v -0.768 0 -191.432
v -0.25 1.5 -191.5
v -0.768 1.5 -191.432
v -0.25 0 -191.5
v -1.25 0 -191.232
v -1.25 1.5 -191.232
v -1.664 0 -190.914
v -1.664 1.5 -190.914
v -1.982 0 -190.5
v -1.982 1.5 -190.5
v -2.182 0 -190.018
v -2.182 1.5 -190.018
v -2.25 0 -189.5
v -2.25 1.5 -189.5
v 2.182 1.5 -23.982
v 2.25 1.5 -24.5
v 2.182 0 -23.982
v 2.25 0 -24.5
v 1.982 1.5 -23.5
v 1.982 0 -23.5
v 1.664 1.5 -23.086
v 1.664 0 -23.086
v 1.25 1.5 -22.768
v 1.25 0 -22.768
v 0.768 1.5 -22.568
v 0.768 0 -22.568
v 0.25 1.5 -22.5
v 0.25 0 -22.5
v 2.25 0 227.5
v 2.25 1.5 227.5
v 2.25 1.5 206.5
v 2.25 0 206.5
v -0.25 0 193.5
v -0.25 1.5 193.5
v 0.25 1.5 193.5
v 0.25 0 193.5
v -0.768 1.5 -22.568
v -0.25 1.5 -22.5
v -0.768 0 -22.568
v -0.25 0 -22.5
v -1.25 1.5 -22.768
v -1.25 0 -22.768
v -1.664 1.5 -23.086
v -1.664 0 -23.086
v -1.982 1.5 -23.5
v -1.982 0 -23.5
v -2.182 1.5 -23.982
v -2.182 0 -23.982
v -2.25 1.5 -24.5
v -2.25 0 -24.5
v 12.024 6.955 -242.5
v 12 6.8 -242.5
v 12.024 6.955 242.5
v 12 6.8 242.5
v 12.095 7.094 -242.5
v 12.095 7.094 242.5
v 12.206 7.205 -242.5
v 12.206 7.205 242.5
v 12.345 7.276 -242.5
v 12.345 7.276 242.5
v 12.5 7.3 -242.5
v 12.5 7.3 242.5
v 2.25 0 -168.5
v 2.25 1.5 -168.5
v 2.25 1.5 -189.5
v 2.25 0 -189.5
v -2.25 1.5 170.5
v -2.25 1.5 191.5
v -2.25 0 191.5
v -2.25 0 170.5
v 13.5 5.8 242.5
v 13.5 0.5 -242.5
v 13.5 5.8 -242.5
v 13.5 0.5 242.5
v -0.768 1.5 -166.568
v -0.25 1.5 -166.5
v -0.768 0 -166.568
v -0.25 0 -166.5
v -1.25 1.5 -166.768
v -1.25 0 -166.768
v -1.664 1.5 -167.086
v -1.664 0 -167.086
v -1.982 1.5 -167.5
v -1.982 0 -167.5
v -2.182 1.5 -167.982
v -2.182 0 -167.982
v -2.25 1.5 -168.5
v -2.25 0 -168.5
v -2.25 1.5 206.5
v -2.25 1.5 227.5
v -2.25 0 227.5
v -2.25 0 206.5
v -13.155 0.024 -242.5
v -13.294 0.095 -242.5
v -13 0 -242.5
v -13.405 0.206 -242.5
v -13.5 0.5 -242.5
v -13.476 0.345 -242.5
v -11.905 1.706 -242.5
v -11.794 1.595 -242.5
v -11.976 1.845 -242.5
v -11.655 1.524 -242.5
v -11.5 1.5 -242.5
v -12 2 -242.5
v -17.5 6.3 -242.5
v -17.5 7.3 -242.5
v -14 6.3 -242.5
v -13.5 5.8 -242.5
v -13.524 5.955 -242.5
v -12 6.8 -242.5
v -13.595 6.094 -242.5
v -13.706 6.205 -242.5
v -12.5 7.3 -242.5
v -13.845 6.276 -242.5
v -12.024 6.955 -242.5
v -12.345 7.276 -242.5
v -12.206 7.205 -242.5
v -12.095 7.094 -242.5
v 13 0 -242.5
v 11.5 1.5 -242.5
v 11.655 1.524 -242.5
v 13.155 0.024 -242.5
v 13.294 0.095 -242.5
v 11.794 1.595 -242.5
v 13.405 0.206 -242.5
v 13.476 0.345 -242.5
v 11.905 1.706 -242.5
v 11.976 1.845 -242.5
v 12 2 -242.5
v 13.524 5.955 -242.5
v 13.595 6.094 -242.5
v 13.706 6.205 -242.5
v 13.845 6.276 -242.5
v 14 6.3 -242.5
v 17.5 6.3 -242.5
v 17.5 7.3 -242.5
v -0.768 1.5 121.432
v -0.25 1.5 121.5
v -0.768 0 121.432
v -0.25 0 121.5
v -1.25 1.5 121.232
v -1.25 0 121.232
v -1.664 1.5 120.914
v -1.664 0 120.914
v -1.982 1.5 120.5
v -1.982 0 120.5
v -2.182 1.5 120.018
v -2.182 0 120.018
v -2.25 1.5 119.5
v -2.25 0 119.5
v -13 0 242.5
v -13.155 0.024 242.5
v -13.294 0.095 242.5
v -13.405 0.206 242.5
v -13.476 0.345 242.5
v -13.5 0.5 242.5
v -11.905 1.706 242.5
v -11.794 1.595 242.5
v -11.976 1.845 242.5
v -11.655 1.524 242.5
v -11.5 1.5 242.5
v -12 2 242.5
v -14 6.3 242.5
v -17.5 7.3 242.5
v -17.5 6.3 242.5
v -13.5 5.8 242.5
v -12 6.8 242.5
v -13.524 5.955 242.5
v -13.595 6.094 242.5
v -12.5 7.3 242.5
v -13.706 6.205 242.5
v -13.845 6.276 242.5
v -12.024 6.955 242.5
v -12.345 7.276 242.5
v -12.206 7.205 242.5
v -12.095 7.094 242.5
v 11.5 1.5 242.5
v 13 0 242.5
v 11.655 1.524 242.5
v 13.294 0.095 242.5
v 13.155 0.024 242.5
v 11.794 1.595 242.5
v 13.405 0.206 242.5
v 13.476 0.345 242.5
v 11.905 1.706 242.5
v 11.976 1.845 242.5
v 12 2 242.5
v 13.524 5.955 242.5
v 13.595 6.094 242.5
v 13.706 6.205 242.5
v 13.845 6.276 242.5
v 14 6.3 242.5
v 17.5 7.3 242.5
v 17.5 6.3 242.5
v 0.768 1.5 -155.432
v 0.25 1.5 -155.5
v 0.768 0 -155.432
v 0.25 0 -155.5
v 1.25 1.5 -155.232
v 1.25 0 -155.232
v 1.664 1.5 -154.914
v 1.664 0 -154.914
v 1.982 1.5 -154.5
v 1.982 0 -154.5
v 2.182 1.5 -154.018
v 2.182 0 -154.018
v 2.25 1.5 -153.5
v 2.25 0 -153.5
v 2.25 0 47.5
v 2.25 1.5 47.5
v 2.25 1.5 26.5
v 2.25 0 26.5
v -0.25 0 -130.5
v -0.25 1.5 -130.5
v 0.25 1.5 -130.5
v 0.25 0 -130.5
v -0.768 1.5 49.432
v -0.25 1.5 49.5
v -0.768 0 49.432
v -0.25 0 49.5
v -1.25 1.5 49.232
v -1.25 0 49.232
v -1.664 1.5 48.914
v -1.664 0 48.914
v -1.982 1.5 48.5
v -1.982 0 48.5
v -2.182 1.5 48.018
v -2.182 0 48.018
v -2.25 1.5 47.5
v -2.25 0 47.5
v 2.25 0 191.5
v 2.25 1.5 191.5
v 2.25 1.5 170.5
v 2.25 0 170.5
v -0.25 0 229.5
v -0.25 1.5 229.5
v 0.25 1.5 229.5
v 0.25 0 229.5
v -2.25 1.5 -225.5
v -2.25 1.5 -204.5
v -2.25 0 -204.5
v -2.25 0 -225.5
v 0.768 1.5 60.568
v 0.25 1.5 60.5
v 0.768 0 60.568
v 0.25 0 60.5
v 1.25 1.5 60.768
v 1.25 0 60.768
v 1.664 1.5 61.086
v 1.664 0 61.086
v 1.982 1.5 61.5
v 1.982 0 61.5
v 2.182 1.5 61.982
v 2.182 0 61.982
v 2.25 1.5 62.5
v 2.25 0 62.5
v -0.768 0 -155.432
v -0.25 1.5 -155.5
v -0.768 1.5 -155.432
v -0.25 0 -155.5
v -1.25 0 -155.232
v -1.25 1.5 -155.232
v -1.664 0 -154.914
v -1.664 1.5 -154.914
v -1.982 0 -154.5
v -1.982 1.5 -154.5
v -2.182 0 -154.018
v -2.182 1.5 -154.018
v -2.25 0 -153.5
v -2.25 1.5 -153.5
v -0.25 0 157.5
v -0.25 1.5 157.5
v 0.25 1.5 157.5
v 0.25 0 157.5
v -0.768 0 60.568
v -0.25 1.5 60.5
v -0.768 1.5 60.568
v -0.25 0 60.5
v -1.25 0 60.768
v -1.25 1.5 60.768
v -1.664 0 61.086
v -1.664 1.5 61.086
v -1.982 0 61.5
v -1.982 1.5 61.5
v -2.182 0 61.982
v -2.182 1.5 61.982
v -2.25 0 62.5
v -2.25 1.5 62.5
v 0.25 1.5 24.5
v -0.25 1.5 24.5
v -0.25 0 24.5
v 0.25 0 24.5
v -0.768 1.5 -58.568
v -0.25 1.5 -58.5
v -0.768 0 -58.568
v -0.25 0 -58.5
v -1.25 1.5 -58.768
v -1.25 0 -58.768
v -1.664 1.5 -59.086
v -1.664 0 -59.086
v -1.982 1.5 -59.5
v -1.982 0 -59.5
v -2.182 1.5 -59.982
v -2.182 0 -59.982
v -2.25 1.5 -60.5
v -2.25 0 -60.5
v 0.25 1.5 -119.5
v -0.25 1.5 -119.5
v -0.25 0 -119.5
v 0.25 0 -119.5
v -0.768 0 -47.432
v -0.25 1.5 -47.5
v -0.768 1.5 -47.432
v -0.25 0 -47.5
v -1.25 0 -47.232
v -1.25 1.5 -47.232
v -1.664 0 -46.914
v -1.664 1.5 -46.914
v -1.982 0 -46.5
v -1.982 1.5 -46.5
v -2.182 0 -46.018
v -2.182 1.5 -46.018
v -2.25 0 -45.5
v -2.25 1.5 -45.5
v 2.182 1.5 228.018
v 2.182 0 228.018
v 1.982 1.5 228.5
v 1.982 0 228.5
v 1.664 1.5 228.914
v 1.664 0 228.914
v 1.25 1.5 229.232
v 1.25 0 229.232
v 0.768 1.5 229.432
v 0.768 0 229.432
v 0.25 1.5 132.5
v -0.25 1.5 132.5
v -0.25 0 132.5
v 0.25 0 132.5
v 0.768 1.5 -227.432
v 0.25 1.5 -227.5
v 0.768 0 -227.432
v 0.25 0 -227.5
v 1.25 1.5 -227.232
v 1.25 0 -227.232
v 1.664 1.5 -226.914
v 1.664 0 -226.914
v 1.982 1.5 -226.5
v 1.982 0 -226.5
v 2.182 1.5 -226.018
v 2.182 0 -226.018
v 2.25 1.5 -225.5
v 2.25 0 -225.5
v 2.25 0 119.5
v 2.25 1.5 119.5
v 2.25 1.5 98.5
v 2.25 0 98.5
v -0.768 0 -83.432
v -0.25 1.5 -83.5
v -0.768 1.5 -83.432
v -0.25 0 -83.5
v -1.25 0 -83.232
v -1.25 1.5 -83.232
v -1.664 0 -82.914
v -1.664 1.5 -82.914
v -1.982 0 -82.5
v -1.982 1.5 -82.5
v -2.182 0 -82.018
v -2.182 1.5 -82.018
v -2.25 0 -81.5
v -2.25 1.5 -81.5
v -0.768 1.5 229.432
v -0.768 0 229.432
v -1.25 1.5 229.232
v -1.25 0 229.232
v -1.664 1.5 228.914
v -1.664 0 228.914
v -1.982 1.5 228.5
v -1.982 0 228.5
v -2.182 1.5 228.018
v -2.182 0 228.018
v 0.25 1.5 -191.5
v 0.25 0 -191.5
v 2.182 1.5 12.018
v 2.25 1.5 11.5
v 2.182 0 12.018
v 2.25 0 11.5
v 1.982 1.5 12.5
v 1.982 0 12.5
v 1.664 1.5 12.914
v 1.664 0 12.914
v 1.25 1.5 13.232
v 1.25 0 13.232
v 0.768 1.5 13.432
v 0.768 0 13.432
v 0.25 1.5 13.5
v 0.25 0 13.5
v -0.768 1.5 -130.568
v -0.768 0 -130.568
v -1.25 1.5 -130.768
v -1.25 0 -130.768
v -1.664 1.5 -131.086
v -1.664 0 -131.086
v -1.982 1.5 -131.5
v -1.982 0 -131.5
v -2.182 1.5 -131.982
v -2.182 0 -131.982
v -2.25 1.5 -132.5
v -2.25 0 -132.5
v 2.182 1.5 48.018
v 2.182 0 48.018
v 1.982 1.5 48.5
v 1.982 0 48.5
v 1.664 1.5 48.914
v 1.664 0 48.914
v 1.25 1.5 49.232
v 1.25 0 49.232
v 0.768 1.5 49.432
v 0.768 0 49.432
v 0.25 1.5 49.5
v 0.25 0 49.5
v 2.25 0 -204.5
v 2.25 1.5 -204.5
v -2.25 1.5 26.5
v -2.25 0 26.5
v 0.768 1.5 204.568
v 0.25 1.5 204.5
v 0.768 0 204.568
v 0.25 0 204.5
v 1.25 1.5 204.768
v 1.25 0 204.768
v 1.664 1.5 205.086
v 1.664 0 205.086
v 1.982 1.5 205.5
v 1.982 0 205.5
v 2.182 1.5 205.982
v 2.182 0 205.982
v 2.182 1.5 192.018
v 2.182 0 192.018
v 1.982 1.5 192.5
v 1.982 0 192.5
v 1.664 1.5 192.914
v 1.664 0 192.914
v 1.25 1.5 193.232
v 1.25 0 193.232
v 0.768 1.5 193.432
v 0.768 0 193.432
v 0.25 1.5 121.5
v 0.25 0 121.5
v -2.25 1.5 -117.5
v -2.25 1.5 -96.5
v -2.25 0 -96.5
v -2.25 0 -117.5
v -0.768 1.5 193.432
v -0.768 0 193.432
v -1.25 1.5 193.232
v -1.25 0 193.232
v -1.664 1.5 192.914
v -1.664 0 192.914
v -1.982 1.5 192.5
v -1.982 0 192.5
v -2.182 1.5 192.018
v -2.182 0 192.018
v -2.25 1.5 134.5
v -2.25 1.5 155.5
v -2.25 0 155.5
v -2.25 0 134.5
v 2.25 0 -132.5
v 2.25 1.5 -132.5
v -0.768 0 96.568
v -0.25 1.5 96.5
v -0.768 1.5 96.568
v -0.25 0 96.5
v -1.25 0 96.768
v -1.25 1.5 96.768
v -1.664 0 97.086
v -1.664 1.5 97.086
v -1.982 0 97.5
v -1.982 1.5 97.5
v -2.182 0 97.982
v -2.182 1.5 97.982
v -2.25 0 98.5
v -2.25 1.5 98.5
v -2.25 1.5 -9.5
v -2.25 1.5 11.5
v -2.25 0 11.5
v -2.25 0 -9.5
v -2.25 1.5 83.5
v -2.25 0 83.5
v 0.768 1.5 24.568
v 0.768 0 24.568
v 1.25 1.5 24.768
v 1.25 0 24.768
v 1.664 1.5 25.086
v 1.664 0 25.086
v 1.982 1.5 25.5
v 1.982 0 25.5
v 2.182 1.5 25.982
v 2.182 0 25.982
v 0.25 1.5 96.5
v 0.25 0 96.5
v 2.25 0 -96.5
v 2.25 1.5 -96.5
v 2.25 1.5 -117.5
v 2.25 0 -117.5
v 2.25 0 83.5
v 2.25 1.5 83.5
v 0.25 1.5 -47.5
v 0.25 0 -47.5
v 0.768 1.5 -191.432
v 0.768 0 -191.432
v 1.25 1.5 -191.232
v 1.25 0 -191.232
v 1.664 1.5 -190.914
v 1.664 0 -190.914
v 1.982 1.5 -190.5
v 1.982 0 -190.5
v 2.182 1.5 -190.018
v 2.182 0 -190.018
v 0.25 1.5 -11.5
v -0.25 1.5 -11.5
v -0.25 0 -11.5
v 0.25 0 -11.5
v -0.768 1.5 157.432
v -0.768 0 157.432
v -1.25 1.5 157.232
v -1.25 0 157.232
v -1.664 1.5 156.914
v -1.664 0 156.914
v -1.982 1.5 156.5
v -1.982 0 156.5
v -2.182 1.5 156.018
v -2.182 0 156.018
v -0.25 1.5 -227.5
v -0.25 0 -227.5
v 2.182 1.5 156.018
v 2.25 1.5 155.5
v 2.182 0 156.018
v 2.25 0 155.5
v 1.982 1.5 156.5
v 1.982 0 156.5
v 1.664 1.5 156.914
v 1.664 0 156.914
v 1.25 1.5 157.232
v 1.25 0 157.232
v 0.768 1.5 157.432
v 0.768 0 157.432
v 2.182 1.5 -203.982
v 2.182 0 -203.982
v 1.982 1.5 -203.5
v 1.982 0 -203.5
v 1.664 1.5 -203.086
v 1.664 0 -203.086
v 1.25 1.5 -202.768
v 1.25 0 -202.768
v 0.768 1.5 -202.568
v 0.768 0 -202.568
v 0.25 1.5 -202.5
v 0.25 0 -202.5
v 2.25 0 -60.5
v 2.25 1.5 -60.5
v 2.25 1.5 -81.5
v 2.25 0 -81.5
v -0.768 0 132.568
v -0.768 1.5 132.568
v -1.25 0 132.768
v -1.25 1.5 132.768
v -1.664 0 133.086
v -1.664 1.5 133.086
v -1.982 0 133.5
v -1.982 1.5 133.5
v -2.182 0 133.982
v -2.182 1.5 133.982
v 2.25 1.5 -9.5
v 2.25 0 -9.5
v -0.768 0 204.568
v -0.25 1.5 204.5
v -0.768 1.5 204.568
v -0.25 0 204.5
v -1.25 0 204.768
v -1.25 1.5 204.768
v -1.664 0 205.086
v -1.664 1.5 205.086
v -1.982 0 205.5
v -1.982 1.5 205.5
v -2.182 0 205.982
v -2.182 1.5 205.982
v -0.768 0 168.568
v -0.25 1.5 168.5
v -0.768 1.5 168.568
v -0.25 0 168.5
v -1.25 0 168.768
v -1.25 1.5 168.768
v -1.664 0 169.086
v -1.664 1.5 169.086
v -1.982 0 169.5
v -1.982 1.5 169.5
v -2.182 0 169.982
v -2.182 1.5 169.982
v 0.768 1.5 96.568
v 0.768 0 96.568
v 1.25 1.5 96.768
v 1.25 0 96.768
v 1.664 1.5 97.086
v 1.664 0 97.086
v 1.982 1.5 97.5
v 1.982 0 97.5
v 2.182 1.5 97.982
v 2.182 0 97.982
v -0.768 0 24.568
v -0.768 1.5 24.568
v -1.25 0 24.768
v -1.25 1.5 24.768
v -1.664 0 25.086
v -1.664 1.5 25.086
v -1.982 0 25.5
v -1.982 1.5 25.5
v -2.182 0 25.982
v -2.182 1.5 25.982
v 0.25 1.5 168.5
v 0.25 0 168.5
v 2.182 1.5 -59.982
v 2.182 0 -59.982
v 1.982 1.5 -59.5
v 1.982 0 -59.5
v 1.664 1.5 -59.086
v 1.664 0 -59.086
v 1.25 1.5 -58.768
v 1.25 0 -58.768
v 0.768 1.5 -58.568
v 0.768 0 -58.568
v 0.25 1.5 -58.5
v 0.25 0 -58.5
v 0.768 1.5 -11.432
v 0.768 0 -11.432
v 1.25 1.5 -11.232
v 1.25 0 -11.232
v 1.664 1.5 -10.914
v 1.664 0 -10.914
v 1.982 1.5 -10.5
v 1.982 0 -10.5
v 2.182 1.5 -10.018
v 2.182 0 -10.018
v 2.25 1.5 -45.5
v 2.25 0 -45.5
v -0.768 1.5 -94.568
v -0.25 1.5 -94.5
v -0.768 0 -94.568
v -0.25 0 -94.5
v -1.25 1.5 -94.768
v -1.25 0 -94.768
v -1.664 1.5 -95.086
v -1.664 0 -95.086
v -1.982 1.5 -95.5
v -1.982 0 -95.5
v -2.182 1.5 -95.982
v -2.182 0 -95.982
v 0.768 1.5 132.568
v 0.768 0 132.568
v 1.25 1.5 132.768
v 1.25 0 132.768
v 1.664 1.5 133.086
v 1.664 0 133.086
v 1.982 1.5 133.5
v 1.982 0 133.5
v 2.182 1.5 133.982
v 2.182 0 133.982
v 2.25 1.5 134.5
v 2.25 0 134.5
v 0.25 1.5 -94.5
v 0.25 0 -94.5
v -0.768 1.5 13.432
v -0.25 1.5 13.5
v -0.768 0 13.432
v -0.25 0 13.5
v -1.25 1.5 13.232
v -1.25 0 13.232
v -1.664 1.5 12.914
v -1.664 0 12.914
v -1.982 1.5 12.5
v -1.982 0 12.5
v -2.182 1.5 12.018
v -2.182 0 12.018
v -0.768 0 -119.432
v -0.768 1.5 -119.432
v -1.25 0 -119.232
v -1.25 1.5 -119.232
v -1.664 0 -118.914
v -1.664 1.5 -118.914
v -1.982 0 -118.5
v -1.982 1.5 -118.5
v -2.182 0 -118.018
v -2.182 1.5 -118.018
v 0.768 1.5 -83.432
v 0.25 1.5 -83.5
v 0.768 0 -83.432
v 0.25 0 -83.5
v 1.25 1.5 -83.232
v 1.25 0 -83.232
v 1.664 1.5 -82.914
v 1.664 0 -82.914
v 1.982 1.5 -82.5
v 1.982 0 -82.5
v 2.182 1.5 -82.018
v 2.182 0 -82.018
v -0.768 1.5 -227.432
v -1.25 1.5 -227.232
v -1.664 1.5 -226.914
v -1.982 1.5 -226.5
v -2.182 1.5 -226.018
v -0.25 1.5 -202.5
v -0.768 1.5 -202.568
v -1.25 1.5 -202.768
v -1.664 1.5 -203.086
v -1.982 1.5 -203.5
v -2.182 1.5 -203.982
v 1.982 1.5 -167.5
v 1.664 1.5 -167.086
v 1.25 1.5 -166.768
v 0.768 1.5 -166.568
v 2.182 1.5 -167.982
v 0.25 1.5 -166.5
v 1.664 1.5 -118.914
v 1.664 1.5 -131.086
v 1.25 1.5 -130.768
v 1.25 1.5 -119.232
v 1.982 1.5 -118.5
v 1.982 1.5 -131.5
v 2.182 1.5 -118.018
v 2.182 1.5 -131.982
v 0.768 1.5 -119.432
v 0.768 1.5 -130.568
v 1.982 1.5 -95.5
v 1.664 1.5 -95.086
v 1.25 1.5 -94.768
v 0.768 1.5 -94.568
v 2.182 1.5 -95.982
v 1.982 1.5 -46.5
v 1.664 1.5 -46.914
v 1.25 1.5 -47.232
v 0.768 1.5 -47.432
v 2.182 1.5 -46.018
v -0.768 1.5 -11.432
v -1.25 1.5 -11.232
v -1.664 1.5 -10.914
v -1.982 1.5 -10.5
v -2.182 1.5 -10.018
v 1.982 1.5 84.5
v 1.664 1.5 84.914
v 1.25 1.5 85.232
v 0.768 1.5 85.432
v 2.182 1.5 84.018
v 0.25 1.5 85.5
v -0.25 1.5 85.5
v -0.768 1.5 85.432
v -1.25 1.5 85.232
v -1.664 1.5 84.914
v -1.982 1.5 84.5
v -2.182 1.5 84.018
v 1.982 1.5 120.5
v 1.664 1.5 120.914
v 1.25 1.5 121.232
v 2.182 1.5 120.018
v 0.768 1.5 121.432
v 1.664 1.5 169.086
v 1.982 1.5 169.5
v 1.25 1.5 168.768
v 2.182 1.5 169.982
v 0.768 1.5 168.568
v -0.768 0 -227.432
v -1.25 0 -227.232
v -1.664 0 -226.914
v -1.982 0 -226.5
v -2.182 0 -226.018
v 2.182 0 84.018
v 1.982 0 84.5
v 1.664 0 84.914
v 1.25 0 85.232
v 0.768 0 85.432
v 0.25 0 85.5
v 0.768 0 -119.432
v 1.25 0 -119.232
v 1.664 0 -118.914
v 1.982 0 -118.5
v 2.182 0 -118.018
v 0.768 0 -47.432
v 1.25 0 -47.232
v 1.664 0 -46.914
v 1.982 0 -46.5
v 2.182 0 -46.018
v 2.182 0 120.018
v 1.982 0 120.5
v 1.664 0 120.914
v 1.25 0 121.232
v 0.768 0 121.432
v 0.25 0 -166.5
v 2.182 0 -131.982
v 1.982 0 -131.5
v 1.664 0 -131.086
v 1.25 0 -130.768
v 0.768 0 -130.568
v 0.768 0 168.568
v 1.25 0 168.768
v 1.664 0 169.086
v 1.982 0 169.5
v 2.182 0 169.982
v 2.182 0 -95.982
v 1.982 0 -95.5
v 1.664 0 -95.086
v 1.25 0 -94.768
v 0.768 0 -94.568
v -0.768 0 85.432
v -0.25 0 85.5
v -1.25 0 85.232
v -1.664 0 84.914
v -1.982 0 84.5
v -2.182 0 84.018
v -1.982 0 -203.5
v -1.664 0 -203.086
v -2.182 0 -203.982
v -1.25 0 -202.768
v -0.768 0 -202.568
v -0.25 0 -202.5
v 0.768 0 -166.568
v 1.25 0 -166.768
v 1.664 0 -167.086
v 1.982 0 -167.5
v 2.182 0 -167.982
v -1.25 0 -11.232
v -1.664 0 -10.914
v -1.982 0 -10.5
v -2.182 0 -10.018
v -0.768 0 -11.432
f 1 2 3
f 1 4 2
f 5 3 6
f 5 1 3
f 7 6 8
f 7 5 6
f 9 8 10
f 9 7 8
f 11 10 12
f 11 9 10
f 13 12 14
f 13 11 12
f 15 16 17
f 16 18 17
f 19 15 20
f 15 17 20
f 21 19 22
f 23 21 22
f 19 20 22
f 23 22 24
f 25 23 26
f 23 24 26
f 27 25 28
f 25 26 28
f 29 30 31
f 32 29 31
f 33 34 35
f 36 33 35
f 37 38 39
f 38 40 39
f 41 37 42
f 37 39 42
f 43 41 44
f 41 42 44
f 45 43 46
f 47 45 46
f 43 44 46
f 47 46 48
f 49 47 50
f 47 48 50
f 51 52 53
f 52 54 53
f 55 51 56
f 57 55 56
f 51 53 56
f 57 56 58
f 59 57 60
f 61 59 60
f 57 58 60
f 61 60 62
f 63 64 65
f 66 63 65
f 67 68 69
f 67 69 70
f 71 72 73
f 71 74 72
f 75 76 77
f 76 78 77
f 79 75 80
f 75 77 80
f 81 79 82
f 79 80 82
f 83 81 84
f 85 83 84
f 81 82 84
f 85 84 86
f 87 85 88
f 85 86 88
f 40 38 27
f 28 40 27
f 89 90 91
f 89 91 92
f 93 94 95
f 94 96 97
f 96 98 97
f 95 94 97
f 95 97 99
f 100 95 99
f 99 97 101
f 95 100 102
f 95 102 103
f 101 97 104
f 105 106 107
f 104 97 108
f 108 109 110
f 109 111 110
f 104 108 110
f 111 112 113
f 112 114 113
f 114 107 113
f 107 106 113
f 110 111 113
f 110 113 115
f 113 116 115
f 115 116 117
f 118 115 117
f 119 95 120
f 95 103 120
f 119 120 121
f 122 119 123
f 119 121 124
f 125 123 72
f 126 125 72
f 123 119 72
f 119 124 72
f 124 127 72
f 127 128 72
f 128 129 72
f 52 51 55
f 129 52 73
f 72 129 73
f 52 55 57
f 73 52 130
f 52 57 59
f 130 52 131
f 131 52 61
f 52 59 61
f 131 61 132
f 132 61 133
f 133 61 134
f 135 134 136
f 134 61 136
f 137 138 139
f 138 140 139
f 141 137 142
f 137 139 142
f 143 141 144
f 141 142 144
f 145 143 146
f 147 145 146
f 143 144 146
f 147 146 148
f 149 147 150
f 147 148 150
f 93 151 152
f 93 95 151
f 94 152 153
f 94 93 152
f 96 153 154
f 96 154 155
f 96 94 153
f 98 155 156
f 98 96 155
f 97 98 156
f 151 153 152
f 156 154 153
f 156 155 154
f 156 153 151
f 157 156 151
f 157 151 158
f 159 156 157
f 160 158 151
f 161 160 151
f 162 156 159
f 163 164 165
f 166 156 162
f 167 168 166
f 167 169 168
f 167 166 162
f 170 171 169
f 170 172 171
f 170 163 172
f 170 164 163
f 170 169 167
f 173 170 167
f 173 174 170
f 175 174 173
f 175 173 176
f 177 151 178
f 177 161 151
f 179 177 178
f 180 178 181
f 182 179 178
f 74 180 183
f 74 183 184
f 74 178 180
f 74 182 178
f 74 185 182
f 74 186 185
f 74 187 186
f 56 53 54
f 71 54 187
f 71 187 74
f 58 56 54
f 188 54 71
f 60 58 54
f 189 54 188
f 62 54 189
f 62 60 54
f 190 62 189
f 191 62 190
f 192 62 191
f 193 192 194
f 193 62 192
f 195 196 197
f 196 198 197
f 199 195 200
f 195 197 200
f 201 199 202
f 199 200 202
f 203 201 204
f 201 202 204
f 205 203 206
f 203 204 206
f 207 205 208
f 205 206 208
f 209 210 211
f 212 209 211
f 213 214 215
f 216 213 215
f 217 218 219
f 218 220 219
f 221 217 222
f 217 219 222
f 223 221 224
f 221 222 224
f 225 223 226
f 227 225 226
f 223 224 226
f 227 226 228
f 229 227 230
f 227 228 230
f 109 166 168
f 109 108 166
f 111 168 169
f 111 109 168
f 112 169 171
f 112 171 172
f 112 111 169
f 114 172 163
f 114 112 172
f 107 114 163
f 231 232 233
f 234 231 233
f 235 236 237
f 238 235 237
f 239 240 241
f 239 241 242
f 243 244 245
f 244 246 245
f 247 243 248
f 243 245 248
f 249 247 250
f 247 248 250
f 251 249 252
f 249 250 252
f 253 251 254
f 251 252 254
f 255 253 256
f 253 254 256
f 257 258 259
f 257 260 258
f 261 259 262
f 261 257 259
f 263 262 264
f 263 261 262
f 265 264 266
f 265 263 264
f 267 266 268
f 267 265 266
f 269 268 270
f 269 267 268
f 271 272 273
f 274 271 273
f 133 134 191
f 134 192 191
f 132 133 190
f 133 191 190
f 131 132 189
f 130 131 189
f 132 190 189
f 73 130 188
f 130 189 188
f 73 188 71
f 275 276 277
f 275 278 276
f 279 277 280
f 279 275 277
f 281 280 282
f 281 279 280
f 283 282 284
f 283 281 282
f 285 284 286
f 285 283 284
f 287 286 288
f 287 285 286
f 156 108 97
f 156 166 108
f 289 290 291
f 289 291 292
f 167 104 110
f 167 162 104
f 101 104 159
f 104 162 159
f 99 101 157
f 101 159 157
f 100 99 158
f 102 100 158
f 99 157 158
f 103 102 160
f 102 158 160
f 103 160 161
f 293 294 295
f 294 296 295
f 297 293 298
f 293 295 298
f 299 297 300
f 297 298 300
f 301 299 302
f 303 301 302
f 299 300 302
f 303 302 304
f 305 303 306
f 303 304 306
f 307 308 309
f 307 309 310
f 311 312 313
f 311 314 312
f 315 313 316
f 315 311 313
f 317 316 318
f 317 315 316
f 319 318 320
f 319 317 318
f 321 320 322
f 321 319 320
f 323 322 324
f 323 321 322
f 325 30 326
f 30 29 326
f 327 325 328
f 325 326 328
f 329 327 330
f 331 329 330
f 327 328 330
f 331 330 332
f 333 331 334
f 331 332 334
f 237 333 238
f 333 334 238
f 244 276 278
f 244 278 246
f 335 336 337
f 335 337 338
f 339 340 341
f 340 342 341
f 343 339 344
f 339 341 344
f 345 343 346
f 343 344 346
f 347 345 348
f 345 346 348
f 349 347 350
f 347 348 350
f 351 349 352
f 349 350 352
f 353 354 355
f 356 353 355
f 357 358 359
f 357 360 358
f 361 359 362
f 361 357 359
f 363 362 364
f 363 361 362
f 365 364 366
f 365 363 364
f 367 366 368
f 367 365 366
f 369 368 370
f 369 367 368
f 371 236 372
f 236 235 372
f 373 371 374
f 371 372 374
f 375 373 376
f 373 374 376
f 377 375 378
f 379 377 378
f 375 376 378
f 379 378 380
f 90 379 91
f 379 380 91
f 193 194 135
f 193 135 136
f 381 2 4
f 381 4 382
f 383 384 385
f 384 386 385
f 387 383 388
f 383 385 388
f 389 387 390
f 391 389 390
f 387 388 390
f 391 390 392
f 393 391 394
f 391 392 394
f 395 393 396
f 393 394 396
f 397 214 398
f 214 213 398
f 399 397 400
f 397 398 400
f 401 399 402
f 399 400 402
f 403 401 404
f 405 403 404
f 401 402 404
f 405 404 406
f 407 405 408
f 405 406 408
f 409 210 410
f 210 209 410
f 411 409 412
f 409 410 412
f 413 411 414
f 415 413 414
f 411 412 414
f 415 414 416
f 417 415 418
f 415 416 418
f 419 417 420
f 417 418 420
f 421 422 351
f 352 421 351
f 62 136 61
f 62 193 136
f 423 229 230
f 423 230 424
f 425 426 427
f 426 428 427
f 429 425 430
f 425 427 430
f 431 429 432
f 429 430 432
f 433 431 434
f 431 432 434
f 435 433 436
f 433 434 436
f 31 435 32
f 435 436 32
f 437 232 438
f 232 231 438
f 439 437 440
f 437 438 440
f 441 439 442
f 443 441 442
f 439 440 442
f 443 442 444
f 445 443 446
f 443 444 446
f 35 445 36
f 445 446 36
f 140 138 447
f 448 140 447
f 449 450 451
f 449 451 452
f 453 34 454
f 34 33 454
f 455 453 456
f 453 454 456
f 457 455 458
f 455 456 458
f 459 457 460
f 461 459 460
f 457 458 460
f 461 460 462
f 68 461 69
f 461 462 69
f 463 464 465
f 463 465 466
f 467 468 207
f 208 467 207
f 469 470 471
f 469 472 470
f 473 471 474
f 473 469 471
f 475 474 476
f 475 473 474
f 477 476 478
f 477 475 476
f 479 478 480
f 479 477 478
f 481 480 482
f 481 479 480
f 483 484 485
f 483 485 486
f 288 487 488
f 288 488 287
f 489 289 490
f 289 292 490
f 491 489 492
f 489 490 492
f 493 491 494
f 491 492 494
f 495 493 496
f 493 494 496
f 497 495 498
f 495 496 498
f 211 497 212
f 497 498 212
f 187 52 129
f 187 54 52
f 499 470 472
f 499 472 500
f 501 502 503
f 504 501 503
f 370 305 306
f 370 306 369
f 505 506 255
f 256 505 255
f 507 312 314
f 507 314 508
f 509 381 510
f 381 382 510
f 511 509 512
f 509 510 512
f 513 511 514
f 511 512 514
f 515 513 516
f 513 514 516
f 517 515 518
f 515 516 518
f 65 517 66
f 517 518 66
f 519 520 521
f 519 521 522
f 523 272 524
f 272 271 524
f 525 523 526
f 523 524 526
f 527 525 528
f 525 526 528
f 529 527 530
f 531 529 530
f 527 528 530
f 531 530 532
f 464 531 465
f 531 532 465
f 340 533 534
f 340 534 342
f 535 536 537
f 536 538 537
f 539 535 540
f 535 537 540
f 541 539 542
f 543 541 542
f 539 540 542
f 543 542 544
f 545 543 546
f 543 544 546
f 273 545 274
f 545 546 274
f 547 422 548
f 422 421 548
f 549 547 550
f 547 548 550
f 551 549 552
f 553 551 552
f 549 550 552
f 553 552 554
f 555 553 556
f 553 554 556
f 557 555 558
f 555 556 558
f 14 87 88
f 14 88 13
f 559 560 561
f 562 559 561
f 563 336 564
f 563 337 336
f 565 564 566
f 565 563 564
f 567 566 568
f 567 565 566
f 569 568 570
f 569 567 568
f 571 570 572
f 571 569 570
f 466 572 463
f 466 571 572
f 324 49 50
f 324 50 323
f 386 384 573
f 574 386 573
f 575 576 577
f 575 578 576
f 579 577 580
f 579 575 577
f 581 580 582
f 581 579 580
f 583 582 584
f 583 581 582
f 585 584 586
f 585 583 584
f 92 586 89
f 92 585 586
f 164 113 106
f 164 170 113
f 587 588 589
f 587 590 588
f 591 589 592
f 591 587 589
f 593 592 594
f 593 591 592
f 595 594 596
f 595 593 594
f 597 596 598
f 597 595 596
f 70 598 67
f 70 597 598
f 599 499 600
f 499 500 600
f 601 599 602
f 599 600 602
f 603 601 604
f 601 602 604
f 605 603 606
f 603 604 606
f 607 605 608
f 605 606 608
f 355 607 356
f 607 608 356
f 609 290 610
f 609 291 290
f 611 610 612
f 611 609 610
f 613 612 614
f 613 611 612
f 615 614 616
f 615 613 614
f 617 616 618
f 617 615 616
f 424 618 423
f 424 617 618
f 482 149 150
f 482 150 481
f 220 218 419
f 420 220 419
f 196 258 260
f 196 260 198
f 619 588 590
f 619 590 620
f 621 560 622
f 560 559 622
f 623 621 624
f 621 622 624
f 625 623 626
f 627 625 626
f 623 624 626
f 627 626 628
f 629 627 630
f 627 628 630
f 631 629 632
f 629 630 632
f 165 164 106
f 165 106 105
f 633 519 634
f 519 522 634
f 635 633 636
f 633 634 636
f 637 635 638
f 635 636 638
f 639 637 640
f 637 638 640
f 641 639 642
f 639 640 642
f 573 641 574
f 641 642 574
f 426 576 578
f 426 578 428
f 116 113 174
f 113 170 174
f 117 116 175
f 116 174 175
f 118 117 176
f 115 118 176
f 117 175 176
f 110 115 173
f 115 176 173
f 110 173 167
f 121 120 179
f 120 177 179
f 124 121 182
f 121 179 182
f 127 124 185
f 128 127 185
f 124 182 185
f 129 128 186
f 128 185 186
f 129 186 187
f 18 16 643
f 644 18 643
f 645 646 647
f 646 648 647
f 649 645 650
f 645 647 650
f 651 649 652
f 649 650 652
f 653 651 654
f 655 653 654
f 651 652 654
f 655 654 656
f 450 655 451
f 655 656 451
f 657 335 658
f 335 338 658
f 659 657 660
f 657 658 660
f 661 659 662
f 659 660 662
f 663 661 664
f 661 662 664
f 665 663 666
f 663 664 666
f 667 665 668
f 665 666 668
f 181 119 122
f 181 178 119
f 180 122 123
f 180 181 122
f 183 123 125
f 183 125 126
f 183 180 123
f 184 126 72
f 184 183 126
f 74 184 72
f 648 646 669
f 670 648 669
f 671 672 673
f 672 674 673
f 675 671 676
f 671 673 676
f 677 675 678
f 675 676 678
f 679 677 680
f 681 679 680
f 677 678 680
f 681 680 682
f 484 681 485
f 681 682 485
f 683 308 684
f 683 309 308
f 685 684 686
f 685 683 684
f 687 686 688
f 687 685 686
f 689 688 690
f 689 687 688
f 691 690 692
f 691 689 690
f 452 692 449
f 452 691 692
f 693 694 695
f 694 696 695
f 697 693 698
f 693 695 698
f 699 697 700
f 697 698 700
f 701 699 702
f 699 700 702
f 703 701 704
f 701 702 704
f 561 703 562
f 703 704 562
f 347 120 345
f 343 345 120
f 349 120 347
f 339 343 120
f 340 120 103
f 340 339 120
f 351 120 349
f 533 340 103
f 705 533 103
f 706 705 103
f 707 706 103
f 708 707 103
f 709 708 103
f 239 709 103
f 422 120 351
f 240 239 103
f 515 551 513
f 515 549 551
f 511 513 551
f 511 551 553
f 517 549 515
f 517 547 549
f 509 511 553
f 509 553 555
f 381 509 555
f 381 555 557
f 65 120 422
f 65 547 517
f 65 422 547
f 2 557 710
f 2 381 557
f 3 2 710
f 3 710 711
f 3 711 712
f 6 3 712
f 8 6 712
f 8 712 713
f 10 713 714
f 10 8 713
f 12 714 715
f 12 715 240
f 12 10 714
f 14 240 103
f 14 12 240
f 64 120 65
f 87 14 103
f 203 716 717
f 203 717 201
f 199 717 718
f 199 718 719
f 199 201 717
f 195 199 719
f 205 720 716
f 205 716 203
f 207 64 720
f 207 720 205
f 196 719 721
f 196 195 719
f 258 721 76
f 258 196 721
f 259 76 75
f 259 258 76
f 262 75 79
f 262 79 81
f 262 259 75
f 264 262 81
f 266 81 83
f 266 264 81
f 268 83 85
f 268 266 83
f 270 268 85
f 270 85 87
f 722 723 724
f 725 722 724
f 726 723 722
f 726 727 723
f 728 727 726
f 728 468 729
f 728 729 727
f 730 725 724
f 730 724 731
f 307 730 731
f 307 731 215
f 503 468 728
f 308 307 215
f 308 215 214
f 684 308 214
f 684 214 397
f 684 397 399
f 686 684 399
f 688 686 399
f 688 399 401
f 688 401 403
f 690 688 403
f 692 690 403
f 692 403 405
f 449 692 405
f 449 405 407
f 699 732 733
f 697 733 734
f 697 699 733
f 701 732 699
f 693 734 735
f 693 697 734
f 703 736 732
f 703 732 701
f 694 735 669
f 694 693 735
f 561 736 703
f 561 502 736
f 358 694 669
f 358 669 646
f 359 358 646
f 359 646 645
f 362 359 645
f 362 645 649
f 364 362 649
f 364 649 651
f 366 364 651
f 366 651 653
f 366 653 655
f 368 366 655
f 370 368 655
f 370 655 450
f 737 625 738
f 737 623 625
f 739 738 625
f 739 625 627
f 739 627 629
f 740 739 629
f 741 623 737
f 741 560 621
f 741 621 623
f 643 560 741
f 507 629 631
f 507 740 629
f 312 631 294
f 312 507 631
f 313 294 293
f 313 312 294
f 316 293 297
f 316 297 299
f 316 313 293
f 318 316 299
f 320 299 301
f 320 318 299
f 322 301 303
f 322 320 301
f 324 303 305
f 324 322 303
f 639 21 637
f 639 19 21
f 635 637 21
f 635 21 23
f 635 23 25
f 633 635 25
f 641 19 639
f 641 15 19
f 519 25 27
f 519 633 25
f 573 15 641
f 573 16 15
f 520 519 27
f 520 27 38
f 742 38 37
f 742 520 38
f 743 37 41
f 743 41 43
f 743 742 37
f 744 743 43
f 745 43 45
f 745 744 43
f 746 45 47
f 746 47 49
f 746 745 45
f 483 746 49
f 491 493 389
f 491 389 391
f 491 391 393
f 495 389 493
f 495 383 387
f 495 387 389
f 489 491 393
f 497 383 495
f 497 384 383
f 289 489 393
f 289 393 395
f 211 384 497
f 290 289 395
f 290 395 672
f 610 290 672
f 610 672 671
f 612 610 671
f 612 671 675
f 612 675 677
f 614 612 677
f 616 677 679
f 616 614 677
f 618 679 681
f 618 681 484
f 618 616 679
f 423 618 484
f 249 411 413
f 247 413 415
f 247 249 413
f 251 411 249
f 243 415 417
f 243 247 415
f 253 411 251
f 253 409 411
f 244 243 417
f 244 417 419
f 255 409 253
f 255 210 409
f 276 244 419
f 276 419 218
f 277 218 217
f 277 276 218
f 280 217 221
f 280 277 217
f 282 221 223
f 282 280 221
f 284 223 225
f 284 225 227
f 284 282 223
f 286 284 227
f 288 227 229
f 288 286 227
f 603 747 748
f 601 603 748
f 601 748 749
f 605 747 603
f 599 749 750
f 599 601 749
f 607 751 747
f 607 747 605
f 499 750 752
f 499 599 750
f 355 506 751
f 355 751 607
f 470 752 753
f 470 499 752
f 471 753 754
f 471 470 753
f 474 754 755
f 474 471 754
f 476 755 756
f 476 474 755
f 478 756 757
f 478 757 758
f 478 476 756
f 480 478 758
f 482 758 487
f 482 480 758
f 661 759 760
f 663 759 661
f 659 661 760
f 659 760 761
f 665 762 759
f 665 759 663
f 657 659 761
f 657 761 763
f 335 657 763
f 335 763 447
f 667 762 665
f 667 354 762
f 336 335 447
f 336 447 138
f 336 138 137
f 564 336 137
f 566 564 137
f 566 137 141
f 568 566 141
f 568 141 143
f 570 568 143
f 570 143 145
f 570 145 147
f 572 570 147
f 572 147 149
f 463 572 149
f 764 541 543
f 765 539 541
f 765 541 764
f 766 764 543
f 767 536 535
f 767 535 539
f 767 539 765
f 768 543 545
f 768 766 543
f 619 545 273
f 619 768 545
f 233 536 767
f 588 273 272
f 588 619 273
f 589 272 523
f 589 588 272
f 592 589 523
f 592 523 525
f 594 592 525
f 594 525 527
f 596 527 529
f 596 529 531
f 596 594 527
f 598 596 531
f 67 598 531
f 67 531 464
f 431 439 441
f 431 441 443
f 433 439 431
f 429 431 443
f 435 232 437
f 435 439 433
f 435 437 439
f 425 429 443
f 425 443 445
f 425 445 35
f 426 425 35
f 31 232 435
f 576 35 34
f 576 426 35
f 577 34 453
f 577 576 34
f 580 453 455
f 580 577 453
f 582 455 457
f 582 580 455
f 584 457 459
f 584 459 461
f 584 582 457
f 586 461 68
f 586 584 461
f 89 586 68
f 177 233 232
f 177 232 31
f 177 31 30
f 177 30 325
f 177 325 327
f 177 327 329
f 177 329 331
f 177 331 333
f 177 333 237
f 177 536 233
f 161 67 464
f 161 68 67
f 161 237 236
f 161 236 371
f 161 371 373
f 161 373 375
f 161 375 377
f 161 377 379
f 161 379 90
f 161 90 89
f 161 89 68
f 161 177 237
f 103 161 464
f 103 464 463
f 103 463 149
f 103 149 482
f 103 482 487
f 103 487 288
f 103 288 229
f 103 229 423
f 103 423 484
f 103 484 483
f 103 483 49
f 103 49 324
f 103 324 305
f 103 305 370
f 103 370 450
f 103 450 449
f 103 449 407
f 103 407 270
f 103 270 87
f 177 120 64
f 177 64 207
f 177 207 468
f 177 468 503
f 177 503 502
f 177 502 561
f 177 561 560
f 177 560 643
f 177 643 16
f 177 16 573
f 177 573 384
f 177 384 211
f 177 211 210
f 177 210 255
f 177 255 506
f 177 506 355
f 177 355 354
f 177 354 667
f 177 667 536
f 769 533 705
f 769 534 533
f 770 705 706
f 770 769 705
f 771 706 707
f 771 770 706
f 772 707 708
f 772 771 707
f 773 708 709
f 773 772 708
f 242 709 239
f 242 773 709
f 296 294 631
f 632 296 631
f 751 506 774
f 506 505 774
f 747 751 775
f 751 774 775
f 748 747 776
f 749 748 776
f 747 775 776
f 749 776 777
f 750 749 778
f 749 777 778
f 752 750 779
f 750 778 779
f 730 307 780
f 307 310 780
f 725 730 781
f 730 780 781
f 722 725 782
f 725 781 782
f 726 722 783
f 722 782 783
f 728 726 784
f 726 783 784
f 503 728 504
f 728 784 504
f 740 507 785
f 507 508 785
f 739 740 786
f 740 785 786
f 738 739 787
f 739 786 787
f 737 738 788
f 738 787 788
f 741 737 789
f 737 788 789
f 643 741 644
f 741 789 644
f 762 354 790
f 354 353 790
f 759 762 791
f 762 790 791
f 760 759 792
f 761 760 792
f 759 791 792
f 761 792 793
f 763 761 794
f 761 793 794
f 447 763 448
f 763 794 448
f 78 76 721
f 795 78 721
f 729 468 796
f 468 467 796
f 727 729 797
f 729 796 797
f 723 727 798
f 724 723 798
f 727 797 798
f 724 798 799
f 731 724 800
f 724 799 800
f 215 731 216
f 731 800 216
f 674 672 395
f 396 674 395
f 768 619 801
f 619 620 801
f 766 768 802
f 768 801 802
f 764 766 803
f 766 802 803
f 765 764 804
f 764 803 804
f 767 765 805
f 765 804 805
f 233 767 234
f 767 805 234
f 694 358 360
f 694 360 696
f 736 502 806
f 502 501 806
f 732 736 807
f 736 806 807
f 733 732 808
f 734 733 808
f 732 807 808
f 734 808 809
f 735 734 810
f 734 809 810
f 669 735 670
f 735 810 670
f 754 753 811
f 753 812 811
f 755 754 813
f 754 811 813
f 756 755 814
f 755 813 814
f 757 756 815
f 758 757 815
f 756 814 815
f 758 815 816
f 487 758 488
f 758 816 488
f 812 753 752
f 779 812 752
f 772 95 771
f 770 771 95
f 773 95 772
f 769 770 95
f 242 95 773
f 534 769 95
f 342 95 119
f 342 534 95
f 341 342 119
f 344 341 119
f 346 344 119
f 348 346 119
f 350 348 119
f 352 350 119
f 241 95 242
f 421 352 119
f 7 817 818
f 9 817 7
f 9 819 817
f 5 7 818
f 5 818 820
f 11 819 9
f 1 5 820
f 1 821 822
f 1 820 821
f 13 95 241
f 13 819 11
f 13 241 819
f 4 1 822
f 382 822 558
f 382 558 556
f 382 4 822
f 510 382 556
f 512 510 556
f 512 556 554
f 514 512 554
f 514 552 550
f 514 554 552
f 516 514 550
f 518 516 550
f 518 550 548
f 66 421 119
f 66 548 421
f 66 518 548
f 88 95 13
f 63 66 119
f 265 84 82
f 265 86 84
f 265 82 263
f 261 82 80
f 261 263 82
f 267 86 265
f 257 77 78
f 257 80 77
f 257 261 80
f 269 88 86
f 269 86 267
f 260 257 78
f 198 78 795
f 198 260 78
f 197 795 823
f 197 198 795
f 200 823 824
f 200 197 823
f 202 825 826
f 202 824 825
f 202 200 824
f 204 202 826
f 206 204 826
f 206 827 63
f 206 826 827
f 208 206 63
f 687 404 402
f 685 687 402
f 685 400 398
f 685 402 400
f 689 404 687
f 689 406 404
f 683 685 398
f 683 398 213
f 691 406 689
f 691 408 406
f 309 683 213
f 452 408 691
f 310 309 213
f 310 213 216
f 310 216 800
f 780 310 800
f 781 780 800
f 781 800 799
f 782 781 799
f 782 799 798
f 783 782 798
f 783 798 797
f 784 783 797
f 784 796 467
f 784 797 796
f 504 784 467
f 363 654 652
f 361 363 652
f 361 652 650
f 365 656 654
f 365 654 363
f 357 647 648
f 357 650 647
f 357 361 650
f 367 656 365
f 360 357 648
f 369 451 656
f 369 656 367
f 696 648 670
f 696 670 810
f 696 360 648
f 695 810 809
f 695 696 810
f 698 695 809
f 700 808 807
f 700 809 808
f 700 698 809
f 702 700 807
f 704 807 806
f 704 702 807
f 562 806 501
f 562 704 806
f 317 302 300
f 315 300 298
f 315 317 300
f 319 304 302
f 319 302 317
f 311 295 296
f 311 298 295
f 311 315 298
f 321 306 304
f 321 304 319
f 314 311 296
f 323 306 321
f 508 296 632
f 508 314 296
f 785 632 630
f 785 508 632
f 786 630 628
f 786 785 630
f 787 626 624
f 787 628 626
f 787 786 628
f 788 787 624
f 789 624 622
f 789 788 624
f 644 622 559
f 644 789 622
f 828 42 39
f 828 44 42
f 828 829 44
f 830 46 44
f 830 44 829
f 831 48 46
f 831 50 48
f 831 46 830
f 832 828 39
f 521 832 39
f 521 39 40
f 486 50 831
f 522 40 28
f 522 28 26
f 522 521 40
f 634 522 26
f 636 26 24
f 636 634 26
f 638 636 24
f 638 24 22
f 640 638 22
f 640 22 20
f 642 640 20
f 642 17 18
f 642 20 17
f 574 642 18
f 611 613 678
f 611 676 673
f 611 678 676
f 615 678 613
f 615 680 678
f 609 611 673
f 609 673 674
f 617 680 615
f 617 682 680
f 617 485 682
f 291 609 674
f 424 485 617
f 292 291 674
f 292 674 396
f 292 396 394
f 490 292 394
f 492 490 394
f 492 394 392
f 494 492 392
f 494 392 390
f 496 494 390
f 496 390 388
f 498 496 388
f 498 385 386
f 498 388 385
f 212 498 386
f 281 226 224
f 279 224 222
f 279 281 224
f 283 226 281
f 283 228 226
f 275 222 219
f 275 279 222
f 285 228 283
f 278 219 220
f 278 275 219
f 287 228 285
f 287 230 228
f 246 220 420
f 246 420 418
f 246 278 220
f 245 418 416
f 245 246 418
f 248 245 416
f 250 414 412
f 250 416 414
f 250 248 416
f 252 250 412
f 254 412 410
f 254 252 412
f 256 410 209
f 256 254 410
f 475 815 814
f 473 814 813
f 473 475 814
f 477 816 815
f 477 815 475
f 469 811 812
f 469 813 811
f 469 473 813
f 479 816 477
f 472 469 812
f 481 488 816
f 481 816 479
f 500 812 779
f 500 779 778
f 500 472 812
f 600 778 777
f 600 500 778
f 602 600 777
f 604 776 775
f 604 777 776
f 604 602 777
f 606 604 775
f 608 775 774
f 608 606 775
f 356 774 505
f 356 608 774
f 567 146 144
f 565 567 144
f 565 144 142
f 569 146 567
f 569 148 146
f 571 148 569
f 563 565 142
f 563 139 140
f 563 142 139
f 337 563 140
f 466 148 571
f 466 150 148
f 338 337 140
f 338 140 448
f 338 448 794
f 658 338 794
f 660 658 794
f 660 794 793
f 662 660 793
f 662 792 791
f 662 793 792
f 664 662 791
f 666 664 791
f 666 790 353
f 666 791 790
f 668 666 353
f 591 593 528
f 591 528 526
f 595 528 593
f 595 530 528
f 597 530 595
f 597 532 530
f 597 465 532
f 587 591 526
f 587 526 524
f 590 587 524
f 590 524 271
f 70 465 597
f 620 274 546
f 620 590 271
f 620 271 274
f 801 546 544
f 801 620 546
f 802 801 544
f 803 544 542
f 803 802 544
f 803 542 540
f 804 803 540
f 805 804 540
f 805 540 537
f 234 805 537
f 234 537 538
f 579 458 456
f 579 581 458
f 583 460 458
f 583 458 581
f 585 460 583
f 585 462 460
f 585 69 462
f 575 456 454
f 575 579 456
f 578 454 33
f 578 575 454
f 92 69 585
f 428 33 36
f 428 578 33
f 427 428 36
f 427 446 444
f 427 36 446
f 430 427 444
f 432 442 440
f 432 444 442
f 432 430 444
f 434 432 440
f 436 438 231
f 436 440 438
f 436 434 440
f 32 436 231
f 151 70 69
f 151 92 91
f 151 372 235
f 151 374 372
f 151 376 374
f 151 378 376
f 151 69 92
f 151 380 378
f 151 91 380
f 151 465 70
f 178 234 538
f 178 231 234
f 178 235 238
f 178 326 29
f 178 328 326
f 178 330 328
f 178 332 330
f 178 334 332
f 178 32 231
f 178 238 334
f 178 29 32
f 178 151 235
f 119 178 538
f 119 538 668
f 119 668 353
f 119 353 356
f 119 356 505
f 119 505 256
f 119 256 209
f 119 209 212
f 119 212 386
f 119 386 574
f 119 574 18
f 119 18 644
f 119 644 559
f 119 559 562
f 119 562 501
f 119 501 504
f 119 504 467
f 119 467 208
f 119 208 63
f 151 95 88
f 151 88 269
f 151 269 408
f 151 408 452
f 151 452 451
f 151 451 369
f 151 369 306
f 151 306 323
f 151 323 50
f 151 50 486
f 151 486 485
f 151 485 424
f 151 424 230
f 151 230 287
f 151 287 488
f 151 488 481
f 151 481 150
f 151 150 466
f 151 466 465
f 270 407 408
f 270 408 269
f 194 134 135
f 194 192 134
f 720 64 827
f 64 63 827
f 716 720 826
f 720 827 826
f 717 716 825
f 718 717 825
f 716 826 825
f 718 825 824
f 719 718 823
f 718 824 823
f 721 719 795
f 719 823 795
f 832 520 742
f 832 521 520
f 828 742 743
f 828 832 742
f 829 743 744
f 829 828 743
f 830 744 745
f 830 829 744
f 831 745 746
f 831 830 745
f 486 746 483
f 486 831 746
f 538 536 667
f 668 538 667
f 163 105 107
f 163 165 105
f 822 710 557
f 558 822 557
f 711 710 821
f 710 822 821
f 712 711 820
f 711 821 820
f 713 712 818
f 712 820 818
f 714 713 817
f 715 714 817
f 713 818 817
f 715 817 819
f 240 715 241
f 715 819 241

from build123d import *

# Parameters (mm, degrees)
BOSS_EXTRUDE1_DEPTH    = 242.5
FILLET1_R              = 0.5
SKETCH2_W              = 4.5
SKETCH2_H              = 25
CUT_EXTRUDE1_DEPTH     = 244.199794408
FILLET2_R              = 2
LPATTERN1_COUNT        = 13
LPATTERN1_PITCH        = 36
FILLET2_OF_LPATTERN1_R = 2


with BuildPart() as part:
    # Sketch1 → Boss-Extrude1 (new, symmetric)
    with BuildSketch(Plane.XY):
        Polygon((-13.5, 0), (13.5, 0), (13.5, 6.3), (17.5, 6.3), (17.5, 7.3), (12, 7.3), (12, 1.5), (-12, 1.5), (-12, 7.3), (-17.5, 7.3), (-17.5, 6.3), (-13.5, 6.3), align=None)
    extrude(amount=BOSS_EXTRUDE1_DEPTH, both=True)

    # Fillet1
    fillet1_edges = [part.edges().sort_by_distance(p)[0] for p in [
        (-13.5, 6.3, 0),
        (-12, 7.3, 0),
        (-12, 1.5, 0),
        (12, 1.5, 0),
        (12, 7.3, 0),
        (13.5, 6.3, 0),
        (13.5, 0, 0),
        (-13.5, 0, 0),
    ]]
    fillet(fillet1_edges, radius=FILLET1_R)

    # Sketch2 → Cut-Extrude1 (cut, through all)
    with BuildSketch(Plane(origin=(0, 1.5, 0), x_dir=(1, 0, 0), z_dir=(0, 1, 0))):
        with Locations((0, 215)):
            Rectangle(SKETCH2_W, SKETCH2_H)
    cut_extrude1 = extrude(amount=-CUT_EXTRUDE1_DEPTH, mode=Mode.SUBTRACT)

    # Fillet2
    fillet2_edges = [part.edges().sort_by_distance(p)[0] for p in [
        (2.25, 0.75, -227.5),
        (2.25, 0.75, -202.5),
        (-2.25, 0.75, -202.5),
        (-2.25, 0.75, -227.5),
    ]]
    fillet(fillet2_edges, radius=FILLET2_R)

    # LPattern1: Cut-Extrude1 ×13
    with Locations(*[(0, 0, i * LPATTERN1_PITCH) for i in range(1, LPATTERN1_COUNT)]):
        add(cut_extrude1, mode=Mode.SUBTRACT)

    # Fillet2 of LPattern1
    fillet2_of_lpattern1_edges = [part.edges().sort_by_distance(p)[0] for p in [
        (2.25, 0.75, -191.5),
        (2.25, 0.75, -166.5),
        (-2.25, 0.75, -166.5),
        (-2.25, 0.75, -191.5),
        (2.25, 0.75, -155.5),
        (2.25, 0.75, -130.5),
        (-2.25, 0.75, -130.5),
        (-2.25, 0.75, -155.5),
        (2.25, 0.75, -119.5),
        (2.25, 0.75, -94.5),
        (-2.25, 0.75, -94.5),
        (-2.25, 0.75, -119.5),
        (2.25, 0.75, -83.5),
        (2.25, 0.75, -58.5),
        (-2.25, 0.75, -58.5),
        (-2.25, 0.75, -83.5),
        (2.25, 0.75, -47.5),
        (2.25, 0.75, -22.5),
        (-2.25, 0.75, -22.5),
        (-2.25, 0.75, -47.5),
        (2.25, 0.75, -11.5),
        (2.25, 0.75, 13.5),
        (-2.25, 0.75, 13.5),
        (-2.25, 0.75, -11.5),
        (2.25, 0.75, 24.5),
        (2.25, 0.75, 49.5),
        (-2.25, 0.75, 49.5),
        (-2.25, 0.75, 24.5),
        (2.25, 0.75, 60.5),
        (2.25, 0.75, 85.5),
        (-2.25, 0.75, 85.5),
        (-2.25, 0.75, 60.5),
        (2.25, 0.75, 96.5),
        (2.25, 0.75, 121.5),
        (-2.25, 0.75, 121.5),
        (-2.25, 0.75, 96.5),
        (2.25, 0.75, 132.5),
        (2.25, 0.75, 157.5),
        (-2.25, 0.75, 157.5),
        (-2.25, 0.75, 132.5),
        (2.25, 0.75, 168.5),
        (2.25, 0.75, 193.5),
        (-2.25, 0.75, 193.5),
        (-2.25, 0.75, 168.5),
        (2.25, 0.75, 204.5),
        (2.25, 0.75, 229.5),
        (-2.25, 0.75, 229.5),
        (-2.25, 0.75, 204.5),
    ]]
    fillet(fillet2_of_lpattern1_edges, radius=FILLET2_OF_LPATTERN1_R)


solid = part.part
